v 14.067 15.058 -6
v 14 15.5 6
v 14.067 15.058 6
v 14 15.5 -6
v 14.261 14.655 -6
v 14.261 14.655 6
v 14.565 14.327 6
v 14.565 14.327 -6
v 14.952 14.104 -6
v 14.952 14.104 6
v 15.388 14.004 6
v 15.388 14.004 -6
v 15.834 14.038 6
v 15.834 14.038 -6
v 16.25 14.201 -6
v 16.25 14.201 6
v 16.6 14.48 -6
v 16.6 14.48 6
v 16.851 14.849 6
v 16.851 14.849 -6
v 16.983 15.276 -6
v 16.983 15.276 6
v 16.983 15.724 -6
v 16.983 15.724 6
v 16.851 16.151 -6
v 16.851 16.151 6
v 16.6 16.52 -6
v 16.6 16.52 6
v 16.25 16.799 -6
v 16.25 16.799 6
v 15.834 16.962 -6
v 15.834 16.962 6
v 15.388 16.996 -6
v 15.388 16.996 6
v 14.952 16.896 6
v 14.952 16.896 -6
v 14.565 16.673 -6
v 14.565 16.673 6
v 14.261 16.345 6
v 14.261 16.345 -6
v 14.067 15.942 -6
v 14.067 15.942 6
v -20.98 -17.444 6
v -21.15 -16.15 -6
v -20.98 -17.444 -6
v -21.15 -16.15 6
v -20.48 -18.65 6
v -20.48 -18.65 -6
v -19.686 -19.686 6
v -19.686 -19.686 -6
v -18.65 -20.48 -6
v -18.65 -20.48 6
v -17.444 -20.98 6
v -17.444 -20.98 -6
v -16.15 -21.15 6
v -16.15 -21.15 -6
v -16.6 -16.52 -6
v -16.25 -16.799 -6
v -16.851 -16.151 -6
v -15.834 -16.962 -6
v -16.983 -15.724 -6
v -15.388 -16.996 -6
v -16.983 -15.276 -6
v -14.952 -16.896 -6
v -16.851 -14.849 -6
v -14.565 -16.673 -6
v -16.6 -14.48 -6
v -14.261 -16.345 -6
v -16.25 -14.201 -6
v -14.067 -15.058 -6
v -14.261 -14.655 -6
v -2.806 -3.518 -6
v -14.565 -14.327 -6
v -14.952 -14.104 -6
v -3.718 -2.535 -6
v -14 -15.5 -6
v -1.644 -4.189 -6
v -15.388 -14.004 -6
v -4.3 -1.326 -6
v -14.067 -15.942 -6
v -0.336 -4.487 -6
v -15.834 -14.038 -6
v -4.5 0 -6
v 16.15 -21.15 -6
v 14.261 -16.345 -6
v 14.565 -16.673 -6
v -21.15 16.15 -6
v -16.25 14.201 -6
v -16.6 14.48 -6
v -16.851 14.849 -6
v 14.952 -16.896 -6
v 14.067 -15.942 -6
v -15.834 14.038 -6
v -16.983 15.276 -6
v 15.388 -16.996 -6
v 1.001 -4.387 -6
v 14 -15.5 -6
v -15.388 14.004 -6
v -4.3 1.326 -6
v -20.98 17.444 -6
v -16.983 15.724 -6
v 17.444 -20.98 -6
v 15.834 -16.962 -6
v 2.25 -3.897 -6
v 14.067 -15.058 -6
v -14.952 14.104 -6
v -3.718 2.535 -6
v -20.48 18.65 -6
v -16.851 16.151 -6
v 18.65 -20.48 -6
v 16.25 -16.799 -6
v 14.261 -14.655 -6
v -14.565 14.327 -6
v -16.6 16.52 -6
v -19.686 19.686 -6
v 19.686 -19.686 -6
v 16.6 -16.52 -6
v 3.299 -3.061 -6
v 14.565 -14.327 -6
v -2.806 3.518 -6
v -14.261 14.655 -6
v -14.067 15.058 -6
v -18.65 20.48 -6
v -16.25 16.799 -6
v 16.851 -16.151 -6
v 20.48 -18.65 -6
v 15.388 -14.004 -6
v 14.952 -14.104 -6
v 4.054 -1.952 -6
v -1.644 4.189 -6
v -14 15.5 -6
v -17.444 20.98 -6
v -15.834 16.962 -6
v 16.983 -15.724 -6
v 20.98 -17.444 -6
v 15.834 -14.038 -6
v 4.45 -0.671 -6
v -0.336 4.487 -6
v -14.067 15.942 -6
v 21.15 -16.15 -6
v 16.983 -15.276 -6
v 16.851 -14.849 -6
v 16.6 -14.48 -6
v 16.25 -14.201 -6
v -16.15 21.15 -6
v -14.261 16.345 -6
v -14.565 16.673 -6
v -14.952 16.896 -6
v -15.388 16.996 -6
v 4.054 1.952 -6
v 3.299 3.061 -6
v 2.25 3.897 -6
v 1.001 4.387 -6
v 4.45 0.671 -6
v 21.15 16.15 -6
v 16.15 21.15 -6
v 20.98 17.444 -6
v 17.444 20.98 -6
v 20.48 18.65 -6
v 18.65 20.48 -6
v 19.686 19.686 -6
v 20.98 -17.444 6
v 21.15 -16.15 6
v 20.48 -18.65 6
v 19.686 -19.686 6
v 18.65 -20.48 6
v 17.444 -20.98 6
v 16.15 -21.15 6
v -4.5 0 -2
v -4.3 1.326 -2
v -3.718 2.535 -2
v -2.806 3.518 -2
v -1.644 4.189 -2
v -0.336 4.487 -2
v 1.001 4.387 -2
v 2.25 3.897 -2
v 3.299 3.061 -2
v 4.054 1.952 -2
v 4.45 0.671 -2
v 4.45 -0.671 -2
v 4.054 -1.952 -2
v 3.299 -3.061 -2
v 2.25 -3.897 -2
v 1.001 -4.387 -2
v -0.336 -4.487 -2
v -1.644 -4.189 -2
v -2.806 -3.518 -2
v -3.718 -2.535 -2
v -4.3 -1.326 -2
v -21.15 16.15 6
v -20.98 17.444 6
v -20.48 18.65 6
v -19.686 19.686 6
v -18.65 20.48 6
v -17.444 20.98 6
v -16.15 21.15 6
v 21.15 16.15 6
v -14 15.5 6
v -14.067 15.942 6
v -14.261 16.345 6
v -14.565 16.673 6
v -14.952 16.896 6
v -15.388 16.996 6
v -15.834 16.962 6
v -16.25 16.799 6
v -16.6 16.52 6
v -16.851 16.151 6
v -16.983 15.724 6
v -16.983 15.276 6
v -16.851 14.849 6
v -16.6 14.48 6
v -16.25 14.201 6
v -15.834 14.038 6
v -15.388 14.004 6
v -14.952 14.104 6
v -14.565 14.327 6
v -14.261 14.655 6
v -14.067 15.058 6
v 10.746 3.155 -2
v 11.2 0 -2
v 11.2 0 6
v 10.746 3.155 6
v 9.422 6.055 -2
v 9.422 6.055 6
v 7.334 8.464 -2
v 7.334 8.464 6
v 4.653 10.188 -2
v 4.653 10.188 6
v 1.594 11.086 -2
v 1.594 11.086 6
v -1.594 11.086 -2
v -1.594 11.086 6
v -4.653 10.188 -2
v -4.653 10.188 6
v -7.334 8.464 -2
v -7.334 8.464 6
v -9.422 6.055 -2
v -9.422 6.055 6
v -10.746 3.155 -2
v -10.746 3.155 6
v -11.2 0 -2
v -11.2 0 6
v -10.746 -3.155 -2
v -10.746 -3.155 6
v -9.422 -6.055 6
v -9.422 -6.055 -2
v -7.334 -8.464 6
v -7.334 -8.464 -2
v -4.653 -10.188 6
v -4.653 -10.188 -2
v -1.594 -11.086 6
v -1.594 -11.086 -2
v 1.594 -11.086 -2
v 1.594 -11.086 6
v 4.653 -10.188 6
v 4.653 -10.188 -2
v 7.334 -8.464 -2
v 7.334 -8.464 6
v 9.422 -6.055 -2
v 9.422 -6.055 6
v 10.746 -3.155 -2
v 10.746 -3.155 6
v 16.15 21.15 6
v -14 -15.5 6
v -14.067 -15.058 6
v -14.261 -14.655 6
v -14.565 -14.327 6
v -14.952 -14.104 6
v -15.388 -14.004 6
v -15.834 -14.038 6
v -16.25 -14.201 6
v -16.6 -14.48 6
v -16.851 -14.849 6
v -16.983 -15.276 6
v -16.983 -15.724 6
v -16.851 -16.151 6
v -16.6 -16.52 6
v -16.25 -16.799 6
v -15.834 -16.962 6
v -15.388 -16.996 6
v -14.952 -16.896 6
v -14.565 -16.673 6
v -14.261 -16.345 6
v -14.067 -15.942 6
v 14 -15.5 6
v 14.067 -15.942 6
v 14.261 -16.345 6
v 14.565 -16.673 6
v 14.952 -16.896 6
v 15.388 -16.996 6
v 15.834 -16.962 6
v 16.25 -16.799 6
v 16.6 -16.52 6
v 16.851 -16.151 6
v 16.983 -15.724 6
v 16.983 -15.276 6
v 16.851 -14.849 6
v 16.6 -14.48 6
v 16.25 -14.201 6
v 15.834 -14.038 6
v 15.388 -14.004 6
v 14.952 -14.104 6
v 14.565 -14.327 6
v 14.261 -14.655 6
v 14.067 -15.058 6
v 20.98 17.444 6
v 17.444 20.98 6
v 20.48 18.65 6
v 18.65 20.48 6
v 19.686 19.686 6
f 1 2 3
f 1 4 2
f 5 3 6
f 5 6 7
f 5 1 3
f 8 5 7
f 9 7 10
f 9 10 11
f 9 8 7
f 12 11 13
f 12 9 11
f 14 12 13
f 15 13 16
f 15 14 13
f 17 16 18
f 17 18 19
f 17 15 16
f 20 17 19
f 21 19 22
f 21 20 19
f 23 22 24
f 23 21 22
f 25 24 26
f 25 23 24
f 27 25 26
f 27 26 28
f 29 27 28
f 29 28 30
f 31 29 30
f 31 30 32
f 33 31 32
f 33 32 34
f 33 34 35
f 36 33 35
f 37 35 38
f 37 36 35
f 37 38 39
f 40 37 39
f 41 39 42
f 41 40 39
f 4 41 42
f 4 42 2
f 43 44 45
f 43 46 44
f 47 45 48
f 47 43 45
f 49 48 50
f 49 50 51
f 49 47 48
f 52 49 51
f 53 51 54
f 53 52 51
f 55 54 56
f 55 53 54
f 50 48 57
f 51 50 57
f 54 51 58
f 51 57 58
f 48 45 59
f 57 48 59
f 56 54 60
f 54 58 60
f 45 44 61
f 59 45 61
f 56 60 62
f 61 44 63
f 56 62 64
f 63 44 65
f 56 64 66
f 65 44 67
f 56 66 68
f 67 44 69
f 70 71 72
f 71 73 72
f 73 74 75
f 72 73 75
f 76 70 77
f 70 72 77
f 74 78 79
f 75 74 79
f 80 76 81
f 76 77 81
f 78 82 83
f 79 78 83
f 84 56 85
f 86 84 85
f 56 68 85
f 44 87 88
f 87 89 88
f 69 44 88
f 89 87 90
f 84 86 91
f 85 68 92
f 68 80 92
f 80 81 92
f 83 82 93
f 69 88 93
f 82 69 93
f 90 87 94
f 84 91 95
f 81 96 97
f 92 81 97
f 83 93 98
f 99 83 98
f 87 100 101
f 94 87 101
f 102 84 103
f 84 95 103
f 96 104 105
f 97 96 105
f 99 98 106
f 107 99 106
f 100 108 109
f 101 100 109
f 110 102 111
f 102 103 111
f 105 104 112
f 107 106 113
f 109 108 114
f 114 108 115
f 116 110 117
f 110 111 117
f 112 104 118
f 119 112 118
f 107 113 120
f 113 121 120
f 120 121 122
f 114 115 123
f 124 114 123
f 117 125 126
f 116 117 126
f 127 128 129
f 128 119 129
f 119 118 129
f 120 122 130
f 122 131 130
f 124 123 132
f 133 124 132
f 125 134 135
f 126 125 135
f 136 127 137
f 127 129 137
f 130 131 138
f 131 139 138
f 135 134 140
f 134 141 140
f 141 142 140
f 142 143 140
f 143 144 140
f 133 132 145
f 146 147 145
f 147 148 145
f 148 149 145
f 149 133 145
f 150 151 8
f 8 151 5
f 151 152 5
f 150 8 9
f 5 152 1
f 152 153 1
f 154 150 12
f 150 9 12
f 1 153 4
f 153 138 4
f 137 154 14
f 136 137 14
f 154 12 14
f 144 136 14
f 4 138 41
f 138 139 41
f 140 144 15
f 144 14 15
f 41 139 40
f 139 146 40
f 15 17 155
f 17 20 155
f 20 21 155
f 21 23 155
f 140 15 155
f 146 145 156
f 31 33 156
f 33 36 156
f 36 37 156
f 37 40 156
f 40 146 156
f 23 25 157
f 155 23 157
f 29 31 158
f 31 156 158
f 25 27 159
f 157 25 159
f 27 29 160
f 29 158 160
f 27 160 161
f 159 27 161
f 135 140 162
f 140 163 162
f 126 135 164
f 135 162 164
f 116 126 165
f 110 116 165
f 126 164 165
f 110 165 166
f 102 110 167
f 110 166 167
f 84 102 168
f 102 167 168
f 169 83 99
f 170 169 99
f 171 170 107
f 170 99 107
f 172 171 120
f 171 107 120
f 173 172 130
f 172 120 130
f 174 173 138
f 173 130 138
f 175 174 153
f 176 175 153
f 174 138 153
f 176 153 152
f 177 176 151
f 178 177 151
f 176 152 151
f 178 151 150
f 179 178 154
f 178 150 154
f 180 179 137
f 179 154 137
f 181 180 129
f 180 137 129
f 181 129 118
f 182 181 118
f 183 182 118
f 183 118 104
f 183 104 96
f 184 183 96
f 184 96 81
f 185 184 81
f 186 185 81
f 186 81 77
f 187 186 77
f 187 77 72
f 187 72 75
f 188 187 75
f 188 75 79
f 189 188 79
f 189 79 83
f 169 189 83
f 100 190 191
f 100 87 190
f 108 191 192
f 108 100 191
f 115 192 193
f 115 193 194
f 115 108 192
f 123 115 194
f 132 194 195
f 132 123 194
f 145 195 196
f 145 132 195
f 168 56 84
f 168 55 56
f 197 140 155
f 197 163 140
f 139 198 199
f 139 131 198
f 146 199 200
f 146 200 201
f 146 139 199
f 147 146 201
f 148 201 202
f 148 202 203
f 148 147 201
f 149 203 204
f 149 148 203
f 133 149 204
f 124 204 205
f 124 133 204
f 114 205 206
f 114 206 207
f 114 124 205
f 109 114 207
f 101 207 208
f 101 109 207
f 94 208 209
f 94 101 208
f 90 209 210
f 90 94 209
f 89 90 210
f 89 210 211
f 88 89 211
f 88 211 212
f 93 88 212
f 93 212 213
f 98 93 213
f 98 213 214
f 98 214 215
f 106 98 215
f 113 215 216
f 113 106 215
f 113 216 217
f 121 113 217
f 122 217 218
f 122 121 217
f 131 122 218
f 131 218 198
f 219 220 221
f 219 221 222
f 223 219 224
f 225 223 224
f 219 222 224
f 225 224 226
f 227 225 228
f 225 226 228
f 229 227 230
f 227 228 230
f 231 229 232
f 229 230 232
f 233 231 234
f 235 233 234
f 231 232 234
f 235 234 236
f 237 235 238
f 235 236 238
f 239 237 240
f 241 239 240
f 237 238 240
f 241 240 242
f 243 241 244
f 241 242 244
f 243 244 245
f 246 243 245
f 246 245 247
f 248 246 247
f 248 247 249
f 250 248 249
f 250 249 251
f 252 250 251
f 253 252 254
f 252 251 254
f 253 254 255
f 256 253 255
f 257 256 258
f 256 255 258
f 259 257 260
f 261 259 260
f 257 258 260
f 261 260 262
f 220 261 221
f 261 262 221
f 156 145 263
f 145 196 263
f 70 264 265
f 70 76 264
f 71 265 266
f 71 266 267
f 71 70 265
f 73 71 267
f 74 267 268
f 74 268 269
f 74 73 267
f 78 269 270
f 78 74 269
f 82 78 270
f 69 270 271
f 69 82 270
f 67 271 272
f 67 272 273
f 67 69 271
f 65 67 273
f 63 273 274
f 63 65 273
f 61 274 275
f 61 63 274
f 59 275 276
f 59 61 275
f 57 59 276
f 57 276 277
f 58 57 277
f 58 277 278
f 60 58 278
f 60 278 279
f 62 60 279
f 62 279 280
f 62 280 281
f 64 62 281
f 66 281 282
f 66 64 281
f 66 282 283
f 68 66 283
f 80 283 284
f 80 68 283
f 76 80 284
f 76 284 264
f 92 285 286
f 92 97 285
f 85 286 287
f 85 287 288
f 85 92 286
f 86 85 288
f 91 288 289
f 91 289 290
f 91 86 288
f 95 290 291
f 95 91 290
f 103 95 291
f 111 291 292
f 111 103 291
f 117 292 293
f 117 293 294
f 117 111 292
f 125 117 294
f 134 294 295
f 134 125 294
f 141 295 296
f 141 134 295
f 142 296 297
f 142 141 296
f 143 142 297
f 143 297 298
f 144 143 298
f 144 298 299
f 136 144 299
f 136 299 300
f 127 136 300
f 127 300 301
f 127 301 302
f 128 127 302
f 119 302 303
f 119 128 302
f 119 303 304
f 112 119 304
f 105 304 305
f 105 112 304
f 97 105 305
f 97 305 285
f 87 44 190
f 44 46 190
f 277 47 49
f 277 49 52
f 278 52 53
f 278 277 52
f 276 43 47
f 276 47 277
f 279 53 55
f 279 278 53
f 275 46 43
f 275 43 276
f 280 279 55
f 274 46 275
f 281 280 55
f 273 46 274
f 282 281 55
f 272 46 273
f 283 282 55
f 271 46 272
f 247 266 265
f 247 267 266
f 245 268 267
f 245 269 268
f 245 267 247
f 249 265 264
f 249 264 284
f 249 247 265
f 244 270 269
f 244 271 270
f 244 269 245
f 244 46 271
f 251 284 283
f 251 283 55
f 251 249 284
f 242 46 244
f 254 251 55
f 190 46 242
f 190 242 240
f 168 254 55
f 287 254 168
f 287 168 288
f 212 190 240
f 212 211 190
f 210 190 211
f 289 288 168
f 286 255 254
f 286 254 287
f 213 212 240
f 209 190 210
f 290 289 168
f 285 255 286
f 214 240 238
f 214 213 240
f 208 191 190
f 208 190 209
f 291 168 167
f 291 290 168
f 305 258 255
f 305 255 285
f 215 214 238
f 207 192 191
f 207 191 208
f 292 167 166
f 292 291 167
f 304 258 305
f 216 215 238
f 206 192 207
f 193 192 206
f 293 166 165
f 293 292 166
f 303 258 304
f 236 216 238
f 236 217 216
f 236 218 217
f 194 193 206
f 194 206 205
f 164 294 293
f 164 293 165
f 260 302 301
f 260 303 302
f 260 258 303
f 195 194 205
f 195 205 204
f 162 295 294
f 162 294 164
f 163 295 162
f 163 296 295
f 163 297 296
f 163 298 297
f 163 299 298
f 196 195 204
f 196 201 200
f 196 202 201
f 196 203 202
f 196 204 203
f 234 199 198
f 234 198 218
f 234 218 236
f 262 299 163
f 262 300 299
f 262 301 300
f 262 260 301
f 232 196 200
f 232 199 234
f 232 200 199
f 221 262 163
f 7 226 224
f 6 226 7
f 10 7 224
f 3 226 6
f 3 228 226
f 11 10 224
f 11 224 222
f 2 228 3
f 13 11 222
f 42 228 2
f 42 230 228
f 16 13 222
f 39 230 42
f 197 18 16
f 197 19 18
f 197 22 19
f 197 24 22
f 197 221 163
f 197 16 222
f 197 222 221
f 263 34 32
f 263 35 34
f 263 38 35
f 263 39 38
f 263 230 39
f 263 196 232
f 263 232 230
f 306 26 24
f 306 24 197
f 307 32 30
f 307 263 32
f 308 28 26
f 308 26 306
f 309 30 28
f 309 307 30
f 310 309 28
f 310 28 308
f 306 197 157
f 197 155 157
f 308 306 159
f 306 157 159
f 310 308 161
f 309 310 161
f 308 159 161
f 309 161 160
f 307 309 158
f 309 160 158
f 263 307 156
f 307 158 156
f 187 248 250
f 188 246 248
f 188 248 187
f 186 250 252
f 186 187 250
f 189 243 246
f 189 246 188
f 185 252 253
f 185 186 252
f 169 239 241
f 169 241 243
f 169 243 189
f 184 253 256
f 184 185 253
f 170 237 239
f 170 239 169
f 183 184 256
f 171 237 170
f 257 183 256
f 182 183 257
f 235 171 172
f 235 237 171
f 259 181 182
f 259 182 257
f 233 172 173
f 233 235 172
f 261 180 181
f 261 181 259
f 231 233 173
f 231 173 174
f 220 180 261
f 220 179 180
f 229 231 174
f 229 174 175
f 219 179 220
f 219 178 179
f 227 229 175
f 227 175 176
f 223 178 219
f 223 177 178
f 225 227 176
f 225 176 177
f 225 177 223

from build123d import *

# Parameters (mm, degrees)
CROQUIS1_W              = 42.3
CROQUIS1_H              = 42.3
CROQUIS1_R              = 1.5
SALIENTE_EXTRUIR1_DEPTH = 6
REDONDEO1_R             = 5
CROQUIS2_R              = 11.2
CORTAR_EXTRUIR1_DEPTH   = 8
CROQUIS3_R              = 4.5
CORTAR_EXTRUIR2_DEPTH   = 10


with BuildPart() as part:
    # Croquis1 → Saliente-Extruir1 (new, symmetric)
    with BuildSketch(Plane.XY):
        Rectangle(CROQUIS1_W, CROQUIS1_H)
        with Locations((-15.5, 15.5)):
            Circle(CROQUIS1_R, mode=Mode.SUBTRACT)
        with Locations((-15.5, -15.5)):
            Circle(CROQUIS1_R, mode=Mode.SUBTRACT)
        with Locations(Location((15.5, -15.5, 0), (0, 0, 180))):
            Circle(CROQUIS1_R, mode=Mode.SUBTRACT)
        with Locations(Location((15.5, 15.5, 0), (0, 0, 180))):
            Circle(CROQUIS1_R, mode=Mode.SUBTRACT)
    extrude(amount=SALIENTE_EXTRUIR1_DEPTH, both=True)

    # Redondeo1
    redondeo1_edges = [part.edges().sort_by_distance(p)[0] for p in [
        (21.15, -21.15, 0),
        (-21.15, -21.15, 0),
        (-21.15, 21.15, 0),
        (21.15, 21.15, 0),
    ]]
    fillet(redondeo1_edges, radius=REDONDEO1_R)

    # Croquis2 → Cortar-Extruir1 (cut)
    with BuildSketch(Plane.XY.offset(6)):
        Circle(CROQUIS2_R)
    extrude(amount=-CORTAR_EXTRUIR1_DEPTH, mode=Mode.SUBTRACT)

    # Croquis3 → Cortar-Extruir2 (cut)
    with BuildSketch(Plane(origin=(0, 0, -6), x_dir=(-1, 0, 0), z_dir=(0, 0, -1))):
        Circle(CROQUIS3_R)
    extrude(amount=-CORTAR_EXTRUIR2_DEPTH, mode=Mode.SUBTRACT)


solid = part.part
